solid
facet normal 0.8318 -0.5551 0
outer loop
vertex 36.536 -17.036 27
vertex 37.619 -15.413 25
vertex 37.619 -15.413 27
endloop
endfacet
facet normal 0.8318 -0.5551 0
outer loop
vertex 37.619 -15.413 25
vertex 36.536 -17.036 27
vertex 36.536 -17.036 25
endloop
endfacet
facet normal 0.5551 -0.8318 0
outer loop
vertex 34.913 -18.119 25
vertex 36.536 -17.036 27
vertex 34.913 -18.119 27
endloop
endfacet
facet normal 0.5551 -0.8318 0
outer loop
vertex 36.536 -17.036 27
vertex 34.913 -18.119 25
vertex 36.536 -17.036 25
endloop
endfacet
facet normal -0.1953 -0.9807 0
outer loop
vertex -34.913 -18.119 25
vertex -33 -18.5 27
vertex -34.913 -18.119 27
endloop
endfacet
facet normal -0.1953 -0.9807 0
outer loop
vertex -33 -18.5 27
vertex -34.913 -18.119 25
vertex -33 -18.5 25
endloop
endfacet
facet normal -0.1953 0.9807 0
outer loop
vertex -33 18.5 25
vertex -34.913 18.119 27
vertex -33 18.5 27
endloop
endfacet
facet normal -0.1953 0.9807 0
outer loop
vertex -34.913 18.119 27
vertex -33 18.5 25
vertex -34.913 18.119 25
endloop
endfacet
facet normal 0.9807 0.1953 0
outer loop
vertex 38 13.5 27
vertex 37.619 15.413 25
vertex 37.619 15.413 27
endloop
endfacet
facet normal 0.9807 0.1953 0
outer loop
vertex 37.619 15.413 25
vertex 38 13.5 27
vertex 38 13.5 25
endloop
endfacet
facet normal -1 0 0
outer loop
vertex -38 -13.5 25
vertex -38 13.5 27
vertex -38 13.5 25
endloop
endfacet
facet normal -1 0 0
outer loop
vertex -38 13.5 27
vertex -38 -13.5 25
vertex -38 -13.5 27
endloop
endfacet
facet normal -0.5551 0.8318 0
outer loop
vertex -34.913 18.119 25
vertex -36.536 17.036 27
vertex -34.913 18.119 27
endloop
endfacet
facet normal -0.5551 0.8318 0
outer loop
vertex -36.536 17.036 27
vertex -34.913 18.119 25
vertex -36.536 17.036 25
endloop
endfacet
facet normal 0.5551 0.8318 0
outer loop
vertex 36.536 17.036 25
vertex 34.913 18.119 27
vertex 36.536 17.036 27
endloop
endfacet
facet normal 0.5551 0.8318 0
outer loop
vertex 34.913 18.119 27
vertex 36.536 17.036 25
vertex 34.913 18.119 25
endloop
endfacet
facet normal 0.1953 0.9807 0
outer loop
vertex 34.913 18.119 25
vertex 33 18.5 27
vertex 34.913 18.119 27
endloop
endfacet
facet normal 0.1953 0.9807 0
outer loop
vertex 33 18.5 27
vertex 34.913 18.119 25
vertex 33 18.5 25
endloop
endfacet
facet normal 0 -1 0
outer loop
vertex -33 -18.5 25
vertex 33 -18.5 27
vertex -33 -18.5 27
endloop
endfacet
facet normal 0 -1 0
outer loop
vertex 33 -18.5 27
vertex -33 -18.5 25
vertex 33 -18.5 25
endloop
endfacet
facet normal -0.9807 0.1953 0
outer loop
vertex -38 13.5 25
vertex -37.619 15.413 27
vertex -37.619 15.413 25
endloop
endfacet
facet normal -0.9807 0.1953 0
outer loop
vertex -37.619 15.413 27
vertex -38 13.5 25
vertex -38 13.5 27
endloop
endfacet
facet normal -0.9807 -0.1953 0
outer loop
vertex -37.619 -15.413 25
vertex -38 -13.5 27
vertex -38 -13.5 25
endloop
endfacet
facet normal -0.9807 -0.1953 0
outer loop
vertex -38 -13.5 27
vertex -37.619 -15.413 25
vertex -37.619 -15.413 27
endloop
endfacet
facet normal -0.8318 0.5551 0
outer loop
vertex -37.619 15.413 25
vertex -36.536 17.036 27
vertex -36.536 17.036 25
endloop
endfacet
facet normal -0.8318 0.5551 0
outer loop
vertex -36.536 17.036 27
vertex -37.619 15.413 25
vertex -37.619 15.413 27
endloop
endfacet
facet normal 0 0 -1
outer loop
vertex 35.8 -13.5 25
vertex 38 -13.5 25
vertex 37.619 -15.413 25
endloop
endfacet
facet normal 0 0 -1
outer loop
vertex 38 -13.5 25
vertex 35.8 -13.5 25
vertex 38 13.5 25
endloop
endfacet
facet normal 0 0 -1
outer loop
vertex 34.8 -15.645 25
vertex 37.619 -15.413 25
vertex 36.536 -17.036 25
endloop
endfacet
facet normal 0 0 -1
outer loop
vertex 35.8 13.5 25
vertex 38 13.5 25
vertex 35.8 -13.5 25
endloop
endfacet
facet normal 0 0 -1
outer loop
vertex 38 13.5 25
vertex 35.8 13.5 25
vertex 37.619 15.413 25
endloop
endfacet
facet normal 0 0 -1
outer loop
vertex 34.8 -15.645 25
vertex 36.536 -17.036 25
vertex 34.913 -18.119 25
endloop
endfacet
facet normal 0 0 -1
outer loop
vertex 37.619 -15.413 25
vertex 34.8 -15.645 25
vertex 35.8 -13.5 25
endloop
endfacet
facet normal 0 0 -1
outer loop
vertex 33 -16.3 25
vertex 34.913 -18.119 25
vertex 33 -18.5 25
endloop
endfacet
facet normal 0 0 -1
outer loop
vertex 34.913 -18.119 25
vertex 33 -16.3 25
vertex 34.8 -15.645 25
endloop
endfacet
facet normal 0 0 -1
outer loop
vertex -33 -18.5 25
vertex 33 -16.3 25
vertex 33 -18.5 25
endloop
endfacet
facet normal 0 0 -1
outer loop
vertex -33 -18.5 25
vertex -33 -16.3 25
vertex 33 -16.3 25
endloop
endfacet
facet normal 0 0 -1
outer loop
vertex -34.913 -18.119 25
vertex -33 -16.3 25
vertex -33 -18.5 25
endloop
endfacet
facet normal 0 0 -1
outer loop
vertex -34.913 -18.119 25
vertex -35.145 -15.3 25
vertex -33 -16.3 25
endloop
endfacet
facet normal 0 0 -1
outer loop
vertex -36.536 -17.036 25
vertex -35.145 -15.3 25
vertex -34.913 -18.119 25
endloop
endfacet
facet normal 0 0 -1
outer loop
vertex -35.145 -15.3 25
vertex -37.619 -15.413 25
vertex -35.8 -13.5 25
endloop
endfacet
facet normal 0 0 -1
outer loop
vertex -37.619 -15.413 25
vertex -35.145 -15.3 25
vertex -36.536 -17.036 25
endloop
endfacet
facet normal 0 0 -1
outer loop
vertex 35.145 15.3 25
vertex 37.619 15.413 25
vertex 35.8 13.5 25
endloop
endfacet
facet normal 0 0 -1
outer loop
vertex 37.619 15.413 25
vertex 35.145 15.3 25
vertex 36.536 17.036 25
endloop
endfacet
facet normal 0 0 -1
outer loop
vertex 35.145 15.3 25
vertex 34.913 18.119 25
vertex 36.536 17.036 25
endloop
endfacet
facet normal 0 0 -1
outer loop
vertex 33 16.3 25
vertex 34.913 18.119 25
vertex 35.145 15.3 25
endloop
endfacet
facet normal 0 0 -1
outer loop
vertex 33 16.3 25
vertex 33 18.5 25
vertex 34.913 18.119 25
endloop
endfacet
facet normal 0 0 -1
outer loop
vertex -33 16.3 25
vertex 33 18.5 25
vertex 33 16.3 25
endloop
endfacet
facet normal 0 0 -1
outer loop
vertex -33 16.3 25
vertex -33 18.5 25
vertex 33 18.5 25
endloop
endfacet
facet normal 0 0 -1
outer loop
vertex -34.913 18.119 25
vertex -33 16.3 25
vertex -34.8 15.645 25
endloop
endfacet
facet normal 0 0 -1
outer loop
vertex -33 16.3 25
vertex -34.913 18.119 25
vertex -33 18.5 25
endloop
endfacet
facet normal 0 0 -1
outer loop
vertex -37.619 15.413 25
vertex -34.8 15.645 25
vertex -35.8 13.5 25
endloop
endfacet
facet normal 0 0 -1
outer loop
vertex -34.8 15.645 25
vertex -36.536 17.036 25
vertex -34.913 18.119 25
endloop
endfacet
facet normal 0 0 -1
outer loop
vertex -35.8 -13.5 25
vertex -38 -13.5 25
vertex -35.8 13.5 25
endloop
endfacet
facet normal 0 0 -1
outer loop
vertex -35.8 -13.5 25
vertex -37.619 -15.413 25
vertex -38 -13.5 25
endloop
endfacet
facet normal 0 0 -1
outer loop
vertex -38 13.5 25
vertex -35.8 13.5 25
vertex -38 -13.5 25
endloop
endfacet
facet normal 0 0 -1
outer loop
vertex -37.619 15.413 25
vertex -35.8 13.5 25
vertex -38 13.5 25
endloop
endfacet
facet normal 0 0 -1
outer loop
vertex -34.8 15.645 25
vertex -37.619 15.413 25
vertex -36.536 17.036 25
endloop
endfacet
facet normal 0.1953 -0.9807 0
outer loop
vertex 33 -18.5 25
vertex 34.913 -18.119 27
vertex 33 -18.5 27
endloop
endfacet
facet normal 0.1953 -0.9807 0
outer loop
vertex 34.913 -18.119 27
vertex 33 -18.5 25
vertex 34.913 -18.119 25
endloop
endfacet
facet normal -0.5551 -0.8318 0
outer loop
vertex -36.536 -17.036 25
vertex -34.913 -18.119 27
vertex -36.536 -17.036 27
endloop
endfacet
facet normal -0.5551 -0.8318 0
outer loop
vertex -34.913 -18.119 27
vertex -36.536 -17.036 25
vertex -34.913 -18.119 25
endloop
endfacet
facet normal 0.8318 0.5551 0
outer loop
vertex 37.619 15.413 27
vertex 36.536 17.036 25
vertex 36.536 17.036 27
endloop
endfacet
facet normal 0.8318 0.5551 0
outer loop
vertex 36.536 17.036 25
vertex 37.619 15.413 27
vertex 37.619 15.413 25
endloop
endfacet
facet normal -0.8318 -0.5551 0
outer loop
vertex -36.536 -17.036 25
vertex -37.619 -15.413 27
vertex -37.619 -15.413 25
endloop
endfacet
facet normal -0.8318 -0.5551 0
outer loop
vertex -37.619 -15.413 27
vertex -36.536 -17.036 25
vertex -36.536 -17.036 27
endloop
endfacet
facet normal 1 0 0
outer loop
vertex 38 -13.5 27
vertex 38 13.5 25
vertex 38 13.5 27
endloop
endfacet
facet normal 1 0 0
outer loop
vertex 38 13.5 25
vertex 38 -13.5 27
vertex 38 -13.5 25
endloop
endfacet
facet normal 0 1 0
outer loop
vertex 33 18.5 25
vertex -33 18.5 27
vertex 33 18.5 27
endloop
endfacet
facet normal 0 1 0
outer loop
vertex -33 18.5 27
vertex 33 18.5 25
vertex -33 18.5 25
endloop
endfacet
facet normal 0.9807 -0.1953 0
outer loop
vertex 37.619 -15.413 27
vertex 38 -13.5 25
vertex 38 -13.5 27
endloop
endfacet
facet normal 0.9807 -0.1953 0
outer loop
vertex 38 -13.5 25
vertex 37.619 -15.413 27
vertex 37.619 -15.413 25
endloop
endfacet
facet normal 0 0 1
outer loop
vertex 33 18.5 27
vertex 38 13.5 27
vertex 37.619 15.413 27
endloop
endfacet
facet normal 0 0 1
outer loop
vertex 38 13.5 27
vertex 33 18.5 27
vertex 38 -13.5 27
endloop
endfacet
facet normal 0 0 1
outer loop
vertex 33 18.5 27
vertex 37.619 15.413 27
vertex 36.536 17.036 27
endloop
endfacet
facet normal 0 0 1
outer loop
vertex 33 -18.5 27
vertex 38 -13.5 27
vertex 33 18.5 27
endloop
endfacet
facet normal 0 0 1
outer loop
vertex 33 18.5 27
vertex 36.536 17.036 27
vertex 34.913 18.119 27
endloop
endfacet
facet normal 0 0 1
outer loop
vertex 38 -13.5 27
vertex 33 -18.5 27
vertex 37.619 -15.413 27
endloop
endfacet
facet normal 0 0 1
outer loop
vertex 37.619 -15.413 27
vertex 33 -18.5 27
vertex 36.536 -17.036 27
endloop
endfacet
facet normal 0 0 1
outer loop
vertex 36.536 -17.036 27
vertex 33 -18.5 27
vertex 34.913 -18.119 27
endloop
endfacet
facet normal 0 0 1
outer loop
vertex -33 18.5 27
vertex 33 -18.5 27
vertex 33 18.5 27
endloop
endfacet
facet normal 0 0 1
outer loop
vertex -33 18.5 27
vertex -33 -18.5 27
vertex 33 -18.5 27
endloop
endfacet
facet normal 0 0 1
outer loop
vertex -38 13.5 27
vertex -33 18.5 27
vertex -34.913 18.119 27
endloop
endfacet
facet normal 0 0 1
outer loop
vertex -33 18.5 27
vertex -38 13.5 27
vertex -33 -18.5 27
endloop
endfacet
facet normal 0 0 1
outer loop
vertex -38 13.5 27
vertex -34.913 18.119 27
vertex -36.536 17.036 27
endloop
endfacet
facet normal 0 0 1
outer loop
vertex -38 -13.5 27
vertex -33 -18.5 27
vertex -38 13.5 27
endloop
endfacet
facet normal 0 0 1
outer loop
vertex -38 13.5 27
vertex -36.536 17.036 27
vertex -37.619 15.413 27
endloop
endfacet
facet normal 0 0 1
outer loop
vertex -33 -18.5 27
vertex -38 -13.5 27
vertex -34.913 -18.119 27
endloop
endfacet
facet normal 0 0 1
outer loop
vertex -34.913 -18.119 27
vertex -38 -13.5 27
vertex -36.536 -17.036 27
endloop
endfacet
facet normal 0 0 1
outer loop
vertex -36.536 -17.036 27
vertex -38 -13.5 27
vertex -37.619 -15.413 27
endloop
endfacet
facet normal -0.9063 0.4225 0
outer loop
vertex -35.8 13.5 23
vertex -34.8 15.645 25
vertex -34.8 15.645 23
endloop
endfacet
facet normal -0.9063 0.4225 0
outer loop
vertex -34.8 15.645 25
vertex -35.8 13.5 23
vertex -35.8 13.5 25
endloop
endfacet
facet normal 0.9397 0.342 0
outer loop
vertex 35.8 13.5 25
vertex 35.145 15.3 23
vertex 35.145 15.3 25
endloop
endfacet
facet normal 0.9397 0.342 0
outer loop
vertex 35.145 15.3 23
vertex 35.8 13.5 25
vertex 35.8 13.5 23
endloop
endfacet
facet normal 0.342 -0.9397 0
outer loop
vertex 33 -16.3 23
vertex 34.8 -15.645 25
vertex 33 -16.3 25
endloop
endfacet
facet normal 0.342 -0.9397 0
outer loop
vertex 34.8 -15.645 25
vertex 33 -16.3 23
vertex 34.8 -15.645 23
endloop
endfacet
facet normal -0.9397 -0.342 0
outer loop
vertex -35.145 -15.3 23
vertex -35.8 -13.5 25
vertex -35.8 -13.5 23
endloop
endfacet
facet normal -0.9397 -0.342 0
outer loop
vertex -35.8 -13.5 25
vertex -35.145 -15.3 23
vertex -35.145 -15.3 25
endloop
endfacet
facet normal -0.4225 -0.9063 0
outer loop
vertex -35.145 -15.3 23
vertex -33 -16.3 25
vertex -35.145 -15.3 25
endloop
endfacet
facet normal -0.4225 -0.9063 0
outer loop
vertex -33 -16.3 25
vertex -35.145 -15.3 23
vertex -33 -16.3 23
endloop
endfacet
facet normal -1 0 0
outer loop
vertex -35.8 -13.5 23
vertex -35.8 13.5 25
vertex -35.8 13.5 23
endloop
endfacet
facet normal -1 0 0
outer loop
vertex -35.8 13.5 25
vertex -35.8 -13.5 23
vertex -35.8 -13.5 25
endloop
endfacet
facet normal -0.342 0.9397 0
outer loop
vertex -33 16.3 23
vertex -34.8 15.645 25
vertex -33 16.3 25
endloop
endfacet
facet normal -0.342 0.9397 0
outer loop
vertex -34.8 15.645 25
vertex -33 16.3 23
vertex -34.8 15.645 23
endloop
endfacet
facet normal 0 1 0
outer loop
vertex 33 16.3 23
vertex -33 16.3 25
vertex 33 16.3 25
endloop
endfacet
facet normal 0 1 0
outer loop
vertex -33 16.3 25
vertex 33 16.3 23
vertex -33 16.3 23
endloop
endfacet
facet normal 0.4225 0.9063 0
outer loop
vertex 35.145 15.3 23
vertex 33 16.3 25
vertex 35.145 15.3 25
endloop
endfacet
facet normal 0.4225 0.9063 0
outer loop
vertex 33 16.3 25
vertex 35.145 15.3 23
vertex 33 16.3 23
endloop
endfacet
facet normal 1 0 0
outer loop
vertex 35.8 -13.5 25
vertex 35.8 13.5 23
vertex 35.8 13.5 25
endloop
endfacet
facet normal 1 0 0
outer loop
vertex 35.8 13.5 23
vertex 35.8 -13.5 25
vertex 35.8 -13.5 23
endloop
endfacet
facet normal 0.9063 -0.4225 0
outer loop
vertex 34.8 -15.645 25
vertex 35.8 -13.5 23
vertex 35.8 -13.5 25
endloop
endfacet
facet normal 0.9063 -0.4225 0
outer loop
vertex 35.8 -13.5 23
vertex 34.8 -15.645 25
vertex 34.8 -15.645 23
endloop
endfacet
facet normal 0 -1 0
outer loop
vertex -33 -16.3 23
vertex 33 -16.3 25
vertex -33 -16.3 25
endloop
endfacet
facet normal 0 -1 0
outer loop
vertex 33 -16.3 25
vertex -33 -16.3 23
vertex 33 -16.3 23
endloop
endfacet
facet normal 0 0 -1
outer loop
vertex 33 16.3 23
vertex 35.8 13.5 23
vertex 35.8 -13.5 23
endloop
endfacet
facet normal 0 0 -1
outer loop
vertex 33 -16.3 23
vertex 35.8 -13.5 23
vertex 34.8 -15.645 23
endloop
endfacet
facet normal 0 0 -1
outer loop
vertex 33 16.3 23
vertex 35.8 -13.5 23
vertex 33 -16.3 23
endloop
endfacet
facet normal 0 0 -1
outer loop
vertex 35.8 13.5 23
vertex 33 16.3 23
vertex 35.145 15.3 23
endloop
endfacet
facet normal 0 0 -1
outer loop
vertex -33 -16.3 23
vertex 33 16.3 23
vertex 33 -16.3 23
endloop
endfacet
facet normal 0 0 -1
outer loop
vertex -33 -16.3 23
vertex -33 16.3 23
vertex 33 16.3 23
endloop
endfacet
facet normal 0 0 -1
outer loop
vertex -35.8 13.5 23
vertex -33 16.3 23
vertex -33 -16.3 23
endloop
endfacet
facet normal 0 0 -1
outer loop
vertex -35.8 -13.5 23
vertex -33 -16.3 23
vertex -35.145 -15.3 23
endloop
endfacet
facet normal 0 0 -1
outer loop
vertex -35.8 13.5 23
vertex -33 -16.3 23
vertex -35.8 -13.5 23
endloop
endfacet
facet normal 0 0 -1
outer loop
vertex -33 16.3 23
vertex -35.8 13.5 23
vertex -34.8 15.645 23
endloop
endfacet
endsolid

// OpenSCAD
// Original Box Parameters
length = 76;            // Outer length of the box
width = 37;             // Outer width of the box
height = 25;            // Height of the box
wall_thickness = 2;     // Thickness of the walls
corner_radius = 5;      // Radius of the outer corners

// Derived Box Parameters
inner_length = length - 2 * wall_thickness; // 70 mm
inner_width = width - 2 * wall_thickness;   // 32 mm
inner_corner_radius = corner_radius - wall_thickness; // 3 mm

// Tolerance for proper fitting
fit_tolerance = 0.2;    // Clearance for the lip to fit into the box

// Cover Parameters
cover_thickness = 2;    // Thickness of the cover's top
lip_height = 2;         // Height of the lip that goes into the box
lip_length = 72 - 2 * fit_tolerance;  // Adjusted for fit tolerance
lip_width = 33 - 2 * fit_tolerance;   // Adjusted for fit tolerance
lip_corner_radius = inner_corner_radius - fit_tolerance; // Adjusted corner radius

// Generate the Cover with Lip
module cover_with_lip() {
    union() {
        // Top plate of the cover
        translate([0, 0, height])
            linear_extrude(cover_thickness)
                rounded_rectangle(length, width, corner_radius);
        
        // Lip that fits inside the box
        translate([0, 0, height - lip_height])
            linear_extrude(lip_height)
                rounded_rectangle(
                    lip_length,
                    lip_width,
                    lip_corner_radius >= 0 ? lip_corner_radius : 0
                );
    }
}

// Render the Cover with Lip
cover_with_lip();

// Module to create a rounded rectangle
module rounded_rectangle(len, wid, rad) {
    rad = min(rad, len / 2, wid / 2);
    offset(r = rad)
        square([len - 2 * rad, wid - 2 * rad], center = true);
}
